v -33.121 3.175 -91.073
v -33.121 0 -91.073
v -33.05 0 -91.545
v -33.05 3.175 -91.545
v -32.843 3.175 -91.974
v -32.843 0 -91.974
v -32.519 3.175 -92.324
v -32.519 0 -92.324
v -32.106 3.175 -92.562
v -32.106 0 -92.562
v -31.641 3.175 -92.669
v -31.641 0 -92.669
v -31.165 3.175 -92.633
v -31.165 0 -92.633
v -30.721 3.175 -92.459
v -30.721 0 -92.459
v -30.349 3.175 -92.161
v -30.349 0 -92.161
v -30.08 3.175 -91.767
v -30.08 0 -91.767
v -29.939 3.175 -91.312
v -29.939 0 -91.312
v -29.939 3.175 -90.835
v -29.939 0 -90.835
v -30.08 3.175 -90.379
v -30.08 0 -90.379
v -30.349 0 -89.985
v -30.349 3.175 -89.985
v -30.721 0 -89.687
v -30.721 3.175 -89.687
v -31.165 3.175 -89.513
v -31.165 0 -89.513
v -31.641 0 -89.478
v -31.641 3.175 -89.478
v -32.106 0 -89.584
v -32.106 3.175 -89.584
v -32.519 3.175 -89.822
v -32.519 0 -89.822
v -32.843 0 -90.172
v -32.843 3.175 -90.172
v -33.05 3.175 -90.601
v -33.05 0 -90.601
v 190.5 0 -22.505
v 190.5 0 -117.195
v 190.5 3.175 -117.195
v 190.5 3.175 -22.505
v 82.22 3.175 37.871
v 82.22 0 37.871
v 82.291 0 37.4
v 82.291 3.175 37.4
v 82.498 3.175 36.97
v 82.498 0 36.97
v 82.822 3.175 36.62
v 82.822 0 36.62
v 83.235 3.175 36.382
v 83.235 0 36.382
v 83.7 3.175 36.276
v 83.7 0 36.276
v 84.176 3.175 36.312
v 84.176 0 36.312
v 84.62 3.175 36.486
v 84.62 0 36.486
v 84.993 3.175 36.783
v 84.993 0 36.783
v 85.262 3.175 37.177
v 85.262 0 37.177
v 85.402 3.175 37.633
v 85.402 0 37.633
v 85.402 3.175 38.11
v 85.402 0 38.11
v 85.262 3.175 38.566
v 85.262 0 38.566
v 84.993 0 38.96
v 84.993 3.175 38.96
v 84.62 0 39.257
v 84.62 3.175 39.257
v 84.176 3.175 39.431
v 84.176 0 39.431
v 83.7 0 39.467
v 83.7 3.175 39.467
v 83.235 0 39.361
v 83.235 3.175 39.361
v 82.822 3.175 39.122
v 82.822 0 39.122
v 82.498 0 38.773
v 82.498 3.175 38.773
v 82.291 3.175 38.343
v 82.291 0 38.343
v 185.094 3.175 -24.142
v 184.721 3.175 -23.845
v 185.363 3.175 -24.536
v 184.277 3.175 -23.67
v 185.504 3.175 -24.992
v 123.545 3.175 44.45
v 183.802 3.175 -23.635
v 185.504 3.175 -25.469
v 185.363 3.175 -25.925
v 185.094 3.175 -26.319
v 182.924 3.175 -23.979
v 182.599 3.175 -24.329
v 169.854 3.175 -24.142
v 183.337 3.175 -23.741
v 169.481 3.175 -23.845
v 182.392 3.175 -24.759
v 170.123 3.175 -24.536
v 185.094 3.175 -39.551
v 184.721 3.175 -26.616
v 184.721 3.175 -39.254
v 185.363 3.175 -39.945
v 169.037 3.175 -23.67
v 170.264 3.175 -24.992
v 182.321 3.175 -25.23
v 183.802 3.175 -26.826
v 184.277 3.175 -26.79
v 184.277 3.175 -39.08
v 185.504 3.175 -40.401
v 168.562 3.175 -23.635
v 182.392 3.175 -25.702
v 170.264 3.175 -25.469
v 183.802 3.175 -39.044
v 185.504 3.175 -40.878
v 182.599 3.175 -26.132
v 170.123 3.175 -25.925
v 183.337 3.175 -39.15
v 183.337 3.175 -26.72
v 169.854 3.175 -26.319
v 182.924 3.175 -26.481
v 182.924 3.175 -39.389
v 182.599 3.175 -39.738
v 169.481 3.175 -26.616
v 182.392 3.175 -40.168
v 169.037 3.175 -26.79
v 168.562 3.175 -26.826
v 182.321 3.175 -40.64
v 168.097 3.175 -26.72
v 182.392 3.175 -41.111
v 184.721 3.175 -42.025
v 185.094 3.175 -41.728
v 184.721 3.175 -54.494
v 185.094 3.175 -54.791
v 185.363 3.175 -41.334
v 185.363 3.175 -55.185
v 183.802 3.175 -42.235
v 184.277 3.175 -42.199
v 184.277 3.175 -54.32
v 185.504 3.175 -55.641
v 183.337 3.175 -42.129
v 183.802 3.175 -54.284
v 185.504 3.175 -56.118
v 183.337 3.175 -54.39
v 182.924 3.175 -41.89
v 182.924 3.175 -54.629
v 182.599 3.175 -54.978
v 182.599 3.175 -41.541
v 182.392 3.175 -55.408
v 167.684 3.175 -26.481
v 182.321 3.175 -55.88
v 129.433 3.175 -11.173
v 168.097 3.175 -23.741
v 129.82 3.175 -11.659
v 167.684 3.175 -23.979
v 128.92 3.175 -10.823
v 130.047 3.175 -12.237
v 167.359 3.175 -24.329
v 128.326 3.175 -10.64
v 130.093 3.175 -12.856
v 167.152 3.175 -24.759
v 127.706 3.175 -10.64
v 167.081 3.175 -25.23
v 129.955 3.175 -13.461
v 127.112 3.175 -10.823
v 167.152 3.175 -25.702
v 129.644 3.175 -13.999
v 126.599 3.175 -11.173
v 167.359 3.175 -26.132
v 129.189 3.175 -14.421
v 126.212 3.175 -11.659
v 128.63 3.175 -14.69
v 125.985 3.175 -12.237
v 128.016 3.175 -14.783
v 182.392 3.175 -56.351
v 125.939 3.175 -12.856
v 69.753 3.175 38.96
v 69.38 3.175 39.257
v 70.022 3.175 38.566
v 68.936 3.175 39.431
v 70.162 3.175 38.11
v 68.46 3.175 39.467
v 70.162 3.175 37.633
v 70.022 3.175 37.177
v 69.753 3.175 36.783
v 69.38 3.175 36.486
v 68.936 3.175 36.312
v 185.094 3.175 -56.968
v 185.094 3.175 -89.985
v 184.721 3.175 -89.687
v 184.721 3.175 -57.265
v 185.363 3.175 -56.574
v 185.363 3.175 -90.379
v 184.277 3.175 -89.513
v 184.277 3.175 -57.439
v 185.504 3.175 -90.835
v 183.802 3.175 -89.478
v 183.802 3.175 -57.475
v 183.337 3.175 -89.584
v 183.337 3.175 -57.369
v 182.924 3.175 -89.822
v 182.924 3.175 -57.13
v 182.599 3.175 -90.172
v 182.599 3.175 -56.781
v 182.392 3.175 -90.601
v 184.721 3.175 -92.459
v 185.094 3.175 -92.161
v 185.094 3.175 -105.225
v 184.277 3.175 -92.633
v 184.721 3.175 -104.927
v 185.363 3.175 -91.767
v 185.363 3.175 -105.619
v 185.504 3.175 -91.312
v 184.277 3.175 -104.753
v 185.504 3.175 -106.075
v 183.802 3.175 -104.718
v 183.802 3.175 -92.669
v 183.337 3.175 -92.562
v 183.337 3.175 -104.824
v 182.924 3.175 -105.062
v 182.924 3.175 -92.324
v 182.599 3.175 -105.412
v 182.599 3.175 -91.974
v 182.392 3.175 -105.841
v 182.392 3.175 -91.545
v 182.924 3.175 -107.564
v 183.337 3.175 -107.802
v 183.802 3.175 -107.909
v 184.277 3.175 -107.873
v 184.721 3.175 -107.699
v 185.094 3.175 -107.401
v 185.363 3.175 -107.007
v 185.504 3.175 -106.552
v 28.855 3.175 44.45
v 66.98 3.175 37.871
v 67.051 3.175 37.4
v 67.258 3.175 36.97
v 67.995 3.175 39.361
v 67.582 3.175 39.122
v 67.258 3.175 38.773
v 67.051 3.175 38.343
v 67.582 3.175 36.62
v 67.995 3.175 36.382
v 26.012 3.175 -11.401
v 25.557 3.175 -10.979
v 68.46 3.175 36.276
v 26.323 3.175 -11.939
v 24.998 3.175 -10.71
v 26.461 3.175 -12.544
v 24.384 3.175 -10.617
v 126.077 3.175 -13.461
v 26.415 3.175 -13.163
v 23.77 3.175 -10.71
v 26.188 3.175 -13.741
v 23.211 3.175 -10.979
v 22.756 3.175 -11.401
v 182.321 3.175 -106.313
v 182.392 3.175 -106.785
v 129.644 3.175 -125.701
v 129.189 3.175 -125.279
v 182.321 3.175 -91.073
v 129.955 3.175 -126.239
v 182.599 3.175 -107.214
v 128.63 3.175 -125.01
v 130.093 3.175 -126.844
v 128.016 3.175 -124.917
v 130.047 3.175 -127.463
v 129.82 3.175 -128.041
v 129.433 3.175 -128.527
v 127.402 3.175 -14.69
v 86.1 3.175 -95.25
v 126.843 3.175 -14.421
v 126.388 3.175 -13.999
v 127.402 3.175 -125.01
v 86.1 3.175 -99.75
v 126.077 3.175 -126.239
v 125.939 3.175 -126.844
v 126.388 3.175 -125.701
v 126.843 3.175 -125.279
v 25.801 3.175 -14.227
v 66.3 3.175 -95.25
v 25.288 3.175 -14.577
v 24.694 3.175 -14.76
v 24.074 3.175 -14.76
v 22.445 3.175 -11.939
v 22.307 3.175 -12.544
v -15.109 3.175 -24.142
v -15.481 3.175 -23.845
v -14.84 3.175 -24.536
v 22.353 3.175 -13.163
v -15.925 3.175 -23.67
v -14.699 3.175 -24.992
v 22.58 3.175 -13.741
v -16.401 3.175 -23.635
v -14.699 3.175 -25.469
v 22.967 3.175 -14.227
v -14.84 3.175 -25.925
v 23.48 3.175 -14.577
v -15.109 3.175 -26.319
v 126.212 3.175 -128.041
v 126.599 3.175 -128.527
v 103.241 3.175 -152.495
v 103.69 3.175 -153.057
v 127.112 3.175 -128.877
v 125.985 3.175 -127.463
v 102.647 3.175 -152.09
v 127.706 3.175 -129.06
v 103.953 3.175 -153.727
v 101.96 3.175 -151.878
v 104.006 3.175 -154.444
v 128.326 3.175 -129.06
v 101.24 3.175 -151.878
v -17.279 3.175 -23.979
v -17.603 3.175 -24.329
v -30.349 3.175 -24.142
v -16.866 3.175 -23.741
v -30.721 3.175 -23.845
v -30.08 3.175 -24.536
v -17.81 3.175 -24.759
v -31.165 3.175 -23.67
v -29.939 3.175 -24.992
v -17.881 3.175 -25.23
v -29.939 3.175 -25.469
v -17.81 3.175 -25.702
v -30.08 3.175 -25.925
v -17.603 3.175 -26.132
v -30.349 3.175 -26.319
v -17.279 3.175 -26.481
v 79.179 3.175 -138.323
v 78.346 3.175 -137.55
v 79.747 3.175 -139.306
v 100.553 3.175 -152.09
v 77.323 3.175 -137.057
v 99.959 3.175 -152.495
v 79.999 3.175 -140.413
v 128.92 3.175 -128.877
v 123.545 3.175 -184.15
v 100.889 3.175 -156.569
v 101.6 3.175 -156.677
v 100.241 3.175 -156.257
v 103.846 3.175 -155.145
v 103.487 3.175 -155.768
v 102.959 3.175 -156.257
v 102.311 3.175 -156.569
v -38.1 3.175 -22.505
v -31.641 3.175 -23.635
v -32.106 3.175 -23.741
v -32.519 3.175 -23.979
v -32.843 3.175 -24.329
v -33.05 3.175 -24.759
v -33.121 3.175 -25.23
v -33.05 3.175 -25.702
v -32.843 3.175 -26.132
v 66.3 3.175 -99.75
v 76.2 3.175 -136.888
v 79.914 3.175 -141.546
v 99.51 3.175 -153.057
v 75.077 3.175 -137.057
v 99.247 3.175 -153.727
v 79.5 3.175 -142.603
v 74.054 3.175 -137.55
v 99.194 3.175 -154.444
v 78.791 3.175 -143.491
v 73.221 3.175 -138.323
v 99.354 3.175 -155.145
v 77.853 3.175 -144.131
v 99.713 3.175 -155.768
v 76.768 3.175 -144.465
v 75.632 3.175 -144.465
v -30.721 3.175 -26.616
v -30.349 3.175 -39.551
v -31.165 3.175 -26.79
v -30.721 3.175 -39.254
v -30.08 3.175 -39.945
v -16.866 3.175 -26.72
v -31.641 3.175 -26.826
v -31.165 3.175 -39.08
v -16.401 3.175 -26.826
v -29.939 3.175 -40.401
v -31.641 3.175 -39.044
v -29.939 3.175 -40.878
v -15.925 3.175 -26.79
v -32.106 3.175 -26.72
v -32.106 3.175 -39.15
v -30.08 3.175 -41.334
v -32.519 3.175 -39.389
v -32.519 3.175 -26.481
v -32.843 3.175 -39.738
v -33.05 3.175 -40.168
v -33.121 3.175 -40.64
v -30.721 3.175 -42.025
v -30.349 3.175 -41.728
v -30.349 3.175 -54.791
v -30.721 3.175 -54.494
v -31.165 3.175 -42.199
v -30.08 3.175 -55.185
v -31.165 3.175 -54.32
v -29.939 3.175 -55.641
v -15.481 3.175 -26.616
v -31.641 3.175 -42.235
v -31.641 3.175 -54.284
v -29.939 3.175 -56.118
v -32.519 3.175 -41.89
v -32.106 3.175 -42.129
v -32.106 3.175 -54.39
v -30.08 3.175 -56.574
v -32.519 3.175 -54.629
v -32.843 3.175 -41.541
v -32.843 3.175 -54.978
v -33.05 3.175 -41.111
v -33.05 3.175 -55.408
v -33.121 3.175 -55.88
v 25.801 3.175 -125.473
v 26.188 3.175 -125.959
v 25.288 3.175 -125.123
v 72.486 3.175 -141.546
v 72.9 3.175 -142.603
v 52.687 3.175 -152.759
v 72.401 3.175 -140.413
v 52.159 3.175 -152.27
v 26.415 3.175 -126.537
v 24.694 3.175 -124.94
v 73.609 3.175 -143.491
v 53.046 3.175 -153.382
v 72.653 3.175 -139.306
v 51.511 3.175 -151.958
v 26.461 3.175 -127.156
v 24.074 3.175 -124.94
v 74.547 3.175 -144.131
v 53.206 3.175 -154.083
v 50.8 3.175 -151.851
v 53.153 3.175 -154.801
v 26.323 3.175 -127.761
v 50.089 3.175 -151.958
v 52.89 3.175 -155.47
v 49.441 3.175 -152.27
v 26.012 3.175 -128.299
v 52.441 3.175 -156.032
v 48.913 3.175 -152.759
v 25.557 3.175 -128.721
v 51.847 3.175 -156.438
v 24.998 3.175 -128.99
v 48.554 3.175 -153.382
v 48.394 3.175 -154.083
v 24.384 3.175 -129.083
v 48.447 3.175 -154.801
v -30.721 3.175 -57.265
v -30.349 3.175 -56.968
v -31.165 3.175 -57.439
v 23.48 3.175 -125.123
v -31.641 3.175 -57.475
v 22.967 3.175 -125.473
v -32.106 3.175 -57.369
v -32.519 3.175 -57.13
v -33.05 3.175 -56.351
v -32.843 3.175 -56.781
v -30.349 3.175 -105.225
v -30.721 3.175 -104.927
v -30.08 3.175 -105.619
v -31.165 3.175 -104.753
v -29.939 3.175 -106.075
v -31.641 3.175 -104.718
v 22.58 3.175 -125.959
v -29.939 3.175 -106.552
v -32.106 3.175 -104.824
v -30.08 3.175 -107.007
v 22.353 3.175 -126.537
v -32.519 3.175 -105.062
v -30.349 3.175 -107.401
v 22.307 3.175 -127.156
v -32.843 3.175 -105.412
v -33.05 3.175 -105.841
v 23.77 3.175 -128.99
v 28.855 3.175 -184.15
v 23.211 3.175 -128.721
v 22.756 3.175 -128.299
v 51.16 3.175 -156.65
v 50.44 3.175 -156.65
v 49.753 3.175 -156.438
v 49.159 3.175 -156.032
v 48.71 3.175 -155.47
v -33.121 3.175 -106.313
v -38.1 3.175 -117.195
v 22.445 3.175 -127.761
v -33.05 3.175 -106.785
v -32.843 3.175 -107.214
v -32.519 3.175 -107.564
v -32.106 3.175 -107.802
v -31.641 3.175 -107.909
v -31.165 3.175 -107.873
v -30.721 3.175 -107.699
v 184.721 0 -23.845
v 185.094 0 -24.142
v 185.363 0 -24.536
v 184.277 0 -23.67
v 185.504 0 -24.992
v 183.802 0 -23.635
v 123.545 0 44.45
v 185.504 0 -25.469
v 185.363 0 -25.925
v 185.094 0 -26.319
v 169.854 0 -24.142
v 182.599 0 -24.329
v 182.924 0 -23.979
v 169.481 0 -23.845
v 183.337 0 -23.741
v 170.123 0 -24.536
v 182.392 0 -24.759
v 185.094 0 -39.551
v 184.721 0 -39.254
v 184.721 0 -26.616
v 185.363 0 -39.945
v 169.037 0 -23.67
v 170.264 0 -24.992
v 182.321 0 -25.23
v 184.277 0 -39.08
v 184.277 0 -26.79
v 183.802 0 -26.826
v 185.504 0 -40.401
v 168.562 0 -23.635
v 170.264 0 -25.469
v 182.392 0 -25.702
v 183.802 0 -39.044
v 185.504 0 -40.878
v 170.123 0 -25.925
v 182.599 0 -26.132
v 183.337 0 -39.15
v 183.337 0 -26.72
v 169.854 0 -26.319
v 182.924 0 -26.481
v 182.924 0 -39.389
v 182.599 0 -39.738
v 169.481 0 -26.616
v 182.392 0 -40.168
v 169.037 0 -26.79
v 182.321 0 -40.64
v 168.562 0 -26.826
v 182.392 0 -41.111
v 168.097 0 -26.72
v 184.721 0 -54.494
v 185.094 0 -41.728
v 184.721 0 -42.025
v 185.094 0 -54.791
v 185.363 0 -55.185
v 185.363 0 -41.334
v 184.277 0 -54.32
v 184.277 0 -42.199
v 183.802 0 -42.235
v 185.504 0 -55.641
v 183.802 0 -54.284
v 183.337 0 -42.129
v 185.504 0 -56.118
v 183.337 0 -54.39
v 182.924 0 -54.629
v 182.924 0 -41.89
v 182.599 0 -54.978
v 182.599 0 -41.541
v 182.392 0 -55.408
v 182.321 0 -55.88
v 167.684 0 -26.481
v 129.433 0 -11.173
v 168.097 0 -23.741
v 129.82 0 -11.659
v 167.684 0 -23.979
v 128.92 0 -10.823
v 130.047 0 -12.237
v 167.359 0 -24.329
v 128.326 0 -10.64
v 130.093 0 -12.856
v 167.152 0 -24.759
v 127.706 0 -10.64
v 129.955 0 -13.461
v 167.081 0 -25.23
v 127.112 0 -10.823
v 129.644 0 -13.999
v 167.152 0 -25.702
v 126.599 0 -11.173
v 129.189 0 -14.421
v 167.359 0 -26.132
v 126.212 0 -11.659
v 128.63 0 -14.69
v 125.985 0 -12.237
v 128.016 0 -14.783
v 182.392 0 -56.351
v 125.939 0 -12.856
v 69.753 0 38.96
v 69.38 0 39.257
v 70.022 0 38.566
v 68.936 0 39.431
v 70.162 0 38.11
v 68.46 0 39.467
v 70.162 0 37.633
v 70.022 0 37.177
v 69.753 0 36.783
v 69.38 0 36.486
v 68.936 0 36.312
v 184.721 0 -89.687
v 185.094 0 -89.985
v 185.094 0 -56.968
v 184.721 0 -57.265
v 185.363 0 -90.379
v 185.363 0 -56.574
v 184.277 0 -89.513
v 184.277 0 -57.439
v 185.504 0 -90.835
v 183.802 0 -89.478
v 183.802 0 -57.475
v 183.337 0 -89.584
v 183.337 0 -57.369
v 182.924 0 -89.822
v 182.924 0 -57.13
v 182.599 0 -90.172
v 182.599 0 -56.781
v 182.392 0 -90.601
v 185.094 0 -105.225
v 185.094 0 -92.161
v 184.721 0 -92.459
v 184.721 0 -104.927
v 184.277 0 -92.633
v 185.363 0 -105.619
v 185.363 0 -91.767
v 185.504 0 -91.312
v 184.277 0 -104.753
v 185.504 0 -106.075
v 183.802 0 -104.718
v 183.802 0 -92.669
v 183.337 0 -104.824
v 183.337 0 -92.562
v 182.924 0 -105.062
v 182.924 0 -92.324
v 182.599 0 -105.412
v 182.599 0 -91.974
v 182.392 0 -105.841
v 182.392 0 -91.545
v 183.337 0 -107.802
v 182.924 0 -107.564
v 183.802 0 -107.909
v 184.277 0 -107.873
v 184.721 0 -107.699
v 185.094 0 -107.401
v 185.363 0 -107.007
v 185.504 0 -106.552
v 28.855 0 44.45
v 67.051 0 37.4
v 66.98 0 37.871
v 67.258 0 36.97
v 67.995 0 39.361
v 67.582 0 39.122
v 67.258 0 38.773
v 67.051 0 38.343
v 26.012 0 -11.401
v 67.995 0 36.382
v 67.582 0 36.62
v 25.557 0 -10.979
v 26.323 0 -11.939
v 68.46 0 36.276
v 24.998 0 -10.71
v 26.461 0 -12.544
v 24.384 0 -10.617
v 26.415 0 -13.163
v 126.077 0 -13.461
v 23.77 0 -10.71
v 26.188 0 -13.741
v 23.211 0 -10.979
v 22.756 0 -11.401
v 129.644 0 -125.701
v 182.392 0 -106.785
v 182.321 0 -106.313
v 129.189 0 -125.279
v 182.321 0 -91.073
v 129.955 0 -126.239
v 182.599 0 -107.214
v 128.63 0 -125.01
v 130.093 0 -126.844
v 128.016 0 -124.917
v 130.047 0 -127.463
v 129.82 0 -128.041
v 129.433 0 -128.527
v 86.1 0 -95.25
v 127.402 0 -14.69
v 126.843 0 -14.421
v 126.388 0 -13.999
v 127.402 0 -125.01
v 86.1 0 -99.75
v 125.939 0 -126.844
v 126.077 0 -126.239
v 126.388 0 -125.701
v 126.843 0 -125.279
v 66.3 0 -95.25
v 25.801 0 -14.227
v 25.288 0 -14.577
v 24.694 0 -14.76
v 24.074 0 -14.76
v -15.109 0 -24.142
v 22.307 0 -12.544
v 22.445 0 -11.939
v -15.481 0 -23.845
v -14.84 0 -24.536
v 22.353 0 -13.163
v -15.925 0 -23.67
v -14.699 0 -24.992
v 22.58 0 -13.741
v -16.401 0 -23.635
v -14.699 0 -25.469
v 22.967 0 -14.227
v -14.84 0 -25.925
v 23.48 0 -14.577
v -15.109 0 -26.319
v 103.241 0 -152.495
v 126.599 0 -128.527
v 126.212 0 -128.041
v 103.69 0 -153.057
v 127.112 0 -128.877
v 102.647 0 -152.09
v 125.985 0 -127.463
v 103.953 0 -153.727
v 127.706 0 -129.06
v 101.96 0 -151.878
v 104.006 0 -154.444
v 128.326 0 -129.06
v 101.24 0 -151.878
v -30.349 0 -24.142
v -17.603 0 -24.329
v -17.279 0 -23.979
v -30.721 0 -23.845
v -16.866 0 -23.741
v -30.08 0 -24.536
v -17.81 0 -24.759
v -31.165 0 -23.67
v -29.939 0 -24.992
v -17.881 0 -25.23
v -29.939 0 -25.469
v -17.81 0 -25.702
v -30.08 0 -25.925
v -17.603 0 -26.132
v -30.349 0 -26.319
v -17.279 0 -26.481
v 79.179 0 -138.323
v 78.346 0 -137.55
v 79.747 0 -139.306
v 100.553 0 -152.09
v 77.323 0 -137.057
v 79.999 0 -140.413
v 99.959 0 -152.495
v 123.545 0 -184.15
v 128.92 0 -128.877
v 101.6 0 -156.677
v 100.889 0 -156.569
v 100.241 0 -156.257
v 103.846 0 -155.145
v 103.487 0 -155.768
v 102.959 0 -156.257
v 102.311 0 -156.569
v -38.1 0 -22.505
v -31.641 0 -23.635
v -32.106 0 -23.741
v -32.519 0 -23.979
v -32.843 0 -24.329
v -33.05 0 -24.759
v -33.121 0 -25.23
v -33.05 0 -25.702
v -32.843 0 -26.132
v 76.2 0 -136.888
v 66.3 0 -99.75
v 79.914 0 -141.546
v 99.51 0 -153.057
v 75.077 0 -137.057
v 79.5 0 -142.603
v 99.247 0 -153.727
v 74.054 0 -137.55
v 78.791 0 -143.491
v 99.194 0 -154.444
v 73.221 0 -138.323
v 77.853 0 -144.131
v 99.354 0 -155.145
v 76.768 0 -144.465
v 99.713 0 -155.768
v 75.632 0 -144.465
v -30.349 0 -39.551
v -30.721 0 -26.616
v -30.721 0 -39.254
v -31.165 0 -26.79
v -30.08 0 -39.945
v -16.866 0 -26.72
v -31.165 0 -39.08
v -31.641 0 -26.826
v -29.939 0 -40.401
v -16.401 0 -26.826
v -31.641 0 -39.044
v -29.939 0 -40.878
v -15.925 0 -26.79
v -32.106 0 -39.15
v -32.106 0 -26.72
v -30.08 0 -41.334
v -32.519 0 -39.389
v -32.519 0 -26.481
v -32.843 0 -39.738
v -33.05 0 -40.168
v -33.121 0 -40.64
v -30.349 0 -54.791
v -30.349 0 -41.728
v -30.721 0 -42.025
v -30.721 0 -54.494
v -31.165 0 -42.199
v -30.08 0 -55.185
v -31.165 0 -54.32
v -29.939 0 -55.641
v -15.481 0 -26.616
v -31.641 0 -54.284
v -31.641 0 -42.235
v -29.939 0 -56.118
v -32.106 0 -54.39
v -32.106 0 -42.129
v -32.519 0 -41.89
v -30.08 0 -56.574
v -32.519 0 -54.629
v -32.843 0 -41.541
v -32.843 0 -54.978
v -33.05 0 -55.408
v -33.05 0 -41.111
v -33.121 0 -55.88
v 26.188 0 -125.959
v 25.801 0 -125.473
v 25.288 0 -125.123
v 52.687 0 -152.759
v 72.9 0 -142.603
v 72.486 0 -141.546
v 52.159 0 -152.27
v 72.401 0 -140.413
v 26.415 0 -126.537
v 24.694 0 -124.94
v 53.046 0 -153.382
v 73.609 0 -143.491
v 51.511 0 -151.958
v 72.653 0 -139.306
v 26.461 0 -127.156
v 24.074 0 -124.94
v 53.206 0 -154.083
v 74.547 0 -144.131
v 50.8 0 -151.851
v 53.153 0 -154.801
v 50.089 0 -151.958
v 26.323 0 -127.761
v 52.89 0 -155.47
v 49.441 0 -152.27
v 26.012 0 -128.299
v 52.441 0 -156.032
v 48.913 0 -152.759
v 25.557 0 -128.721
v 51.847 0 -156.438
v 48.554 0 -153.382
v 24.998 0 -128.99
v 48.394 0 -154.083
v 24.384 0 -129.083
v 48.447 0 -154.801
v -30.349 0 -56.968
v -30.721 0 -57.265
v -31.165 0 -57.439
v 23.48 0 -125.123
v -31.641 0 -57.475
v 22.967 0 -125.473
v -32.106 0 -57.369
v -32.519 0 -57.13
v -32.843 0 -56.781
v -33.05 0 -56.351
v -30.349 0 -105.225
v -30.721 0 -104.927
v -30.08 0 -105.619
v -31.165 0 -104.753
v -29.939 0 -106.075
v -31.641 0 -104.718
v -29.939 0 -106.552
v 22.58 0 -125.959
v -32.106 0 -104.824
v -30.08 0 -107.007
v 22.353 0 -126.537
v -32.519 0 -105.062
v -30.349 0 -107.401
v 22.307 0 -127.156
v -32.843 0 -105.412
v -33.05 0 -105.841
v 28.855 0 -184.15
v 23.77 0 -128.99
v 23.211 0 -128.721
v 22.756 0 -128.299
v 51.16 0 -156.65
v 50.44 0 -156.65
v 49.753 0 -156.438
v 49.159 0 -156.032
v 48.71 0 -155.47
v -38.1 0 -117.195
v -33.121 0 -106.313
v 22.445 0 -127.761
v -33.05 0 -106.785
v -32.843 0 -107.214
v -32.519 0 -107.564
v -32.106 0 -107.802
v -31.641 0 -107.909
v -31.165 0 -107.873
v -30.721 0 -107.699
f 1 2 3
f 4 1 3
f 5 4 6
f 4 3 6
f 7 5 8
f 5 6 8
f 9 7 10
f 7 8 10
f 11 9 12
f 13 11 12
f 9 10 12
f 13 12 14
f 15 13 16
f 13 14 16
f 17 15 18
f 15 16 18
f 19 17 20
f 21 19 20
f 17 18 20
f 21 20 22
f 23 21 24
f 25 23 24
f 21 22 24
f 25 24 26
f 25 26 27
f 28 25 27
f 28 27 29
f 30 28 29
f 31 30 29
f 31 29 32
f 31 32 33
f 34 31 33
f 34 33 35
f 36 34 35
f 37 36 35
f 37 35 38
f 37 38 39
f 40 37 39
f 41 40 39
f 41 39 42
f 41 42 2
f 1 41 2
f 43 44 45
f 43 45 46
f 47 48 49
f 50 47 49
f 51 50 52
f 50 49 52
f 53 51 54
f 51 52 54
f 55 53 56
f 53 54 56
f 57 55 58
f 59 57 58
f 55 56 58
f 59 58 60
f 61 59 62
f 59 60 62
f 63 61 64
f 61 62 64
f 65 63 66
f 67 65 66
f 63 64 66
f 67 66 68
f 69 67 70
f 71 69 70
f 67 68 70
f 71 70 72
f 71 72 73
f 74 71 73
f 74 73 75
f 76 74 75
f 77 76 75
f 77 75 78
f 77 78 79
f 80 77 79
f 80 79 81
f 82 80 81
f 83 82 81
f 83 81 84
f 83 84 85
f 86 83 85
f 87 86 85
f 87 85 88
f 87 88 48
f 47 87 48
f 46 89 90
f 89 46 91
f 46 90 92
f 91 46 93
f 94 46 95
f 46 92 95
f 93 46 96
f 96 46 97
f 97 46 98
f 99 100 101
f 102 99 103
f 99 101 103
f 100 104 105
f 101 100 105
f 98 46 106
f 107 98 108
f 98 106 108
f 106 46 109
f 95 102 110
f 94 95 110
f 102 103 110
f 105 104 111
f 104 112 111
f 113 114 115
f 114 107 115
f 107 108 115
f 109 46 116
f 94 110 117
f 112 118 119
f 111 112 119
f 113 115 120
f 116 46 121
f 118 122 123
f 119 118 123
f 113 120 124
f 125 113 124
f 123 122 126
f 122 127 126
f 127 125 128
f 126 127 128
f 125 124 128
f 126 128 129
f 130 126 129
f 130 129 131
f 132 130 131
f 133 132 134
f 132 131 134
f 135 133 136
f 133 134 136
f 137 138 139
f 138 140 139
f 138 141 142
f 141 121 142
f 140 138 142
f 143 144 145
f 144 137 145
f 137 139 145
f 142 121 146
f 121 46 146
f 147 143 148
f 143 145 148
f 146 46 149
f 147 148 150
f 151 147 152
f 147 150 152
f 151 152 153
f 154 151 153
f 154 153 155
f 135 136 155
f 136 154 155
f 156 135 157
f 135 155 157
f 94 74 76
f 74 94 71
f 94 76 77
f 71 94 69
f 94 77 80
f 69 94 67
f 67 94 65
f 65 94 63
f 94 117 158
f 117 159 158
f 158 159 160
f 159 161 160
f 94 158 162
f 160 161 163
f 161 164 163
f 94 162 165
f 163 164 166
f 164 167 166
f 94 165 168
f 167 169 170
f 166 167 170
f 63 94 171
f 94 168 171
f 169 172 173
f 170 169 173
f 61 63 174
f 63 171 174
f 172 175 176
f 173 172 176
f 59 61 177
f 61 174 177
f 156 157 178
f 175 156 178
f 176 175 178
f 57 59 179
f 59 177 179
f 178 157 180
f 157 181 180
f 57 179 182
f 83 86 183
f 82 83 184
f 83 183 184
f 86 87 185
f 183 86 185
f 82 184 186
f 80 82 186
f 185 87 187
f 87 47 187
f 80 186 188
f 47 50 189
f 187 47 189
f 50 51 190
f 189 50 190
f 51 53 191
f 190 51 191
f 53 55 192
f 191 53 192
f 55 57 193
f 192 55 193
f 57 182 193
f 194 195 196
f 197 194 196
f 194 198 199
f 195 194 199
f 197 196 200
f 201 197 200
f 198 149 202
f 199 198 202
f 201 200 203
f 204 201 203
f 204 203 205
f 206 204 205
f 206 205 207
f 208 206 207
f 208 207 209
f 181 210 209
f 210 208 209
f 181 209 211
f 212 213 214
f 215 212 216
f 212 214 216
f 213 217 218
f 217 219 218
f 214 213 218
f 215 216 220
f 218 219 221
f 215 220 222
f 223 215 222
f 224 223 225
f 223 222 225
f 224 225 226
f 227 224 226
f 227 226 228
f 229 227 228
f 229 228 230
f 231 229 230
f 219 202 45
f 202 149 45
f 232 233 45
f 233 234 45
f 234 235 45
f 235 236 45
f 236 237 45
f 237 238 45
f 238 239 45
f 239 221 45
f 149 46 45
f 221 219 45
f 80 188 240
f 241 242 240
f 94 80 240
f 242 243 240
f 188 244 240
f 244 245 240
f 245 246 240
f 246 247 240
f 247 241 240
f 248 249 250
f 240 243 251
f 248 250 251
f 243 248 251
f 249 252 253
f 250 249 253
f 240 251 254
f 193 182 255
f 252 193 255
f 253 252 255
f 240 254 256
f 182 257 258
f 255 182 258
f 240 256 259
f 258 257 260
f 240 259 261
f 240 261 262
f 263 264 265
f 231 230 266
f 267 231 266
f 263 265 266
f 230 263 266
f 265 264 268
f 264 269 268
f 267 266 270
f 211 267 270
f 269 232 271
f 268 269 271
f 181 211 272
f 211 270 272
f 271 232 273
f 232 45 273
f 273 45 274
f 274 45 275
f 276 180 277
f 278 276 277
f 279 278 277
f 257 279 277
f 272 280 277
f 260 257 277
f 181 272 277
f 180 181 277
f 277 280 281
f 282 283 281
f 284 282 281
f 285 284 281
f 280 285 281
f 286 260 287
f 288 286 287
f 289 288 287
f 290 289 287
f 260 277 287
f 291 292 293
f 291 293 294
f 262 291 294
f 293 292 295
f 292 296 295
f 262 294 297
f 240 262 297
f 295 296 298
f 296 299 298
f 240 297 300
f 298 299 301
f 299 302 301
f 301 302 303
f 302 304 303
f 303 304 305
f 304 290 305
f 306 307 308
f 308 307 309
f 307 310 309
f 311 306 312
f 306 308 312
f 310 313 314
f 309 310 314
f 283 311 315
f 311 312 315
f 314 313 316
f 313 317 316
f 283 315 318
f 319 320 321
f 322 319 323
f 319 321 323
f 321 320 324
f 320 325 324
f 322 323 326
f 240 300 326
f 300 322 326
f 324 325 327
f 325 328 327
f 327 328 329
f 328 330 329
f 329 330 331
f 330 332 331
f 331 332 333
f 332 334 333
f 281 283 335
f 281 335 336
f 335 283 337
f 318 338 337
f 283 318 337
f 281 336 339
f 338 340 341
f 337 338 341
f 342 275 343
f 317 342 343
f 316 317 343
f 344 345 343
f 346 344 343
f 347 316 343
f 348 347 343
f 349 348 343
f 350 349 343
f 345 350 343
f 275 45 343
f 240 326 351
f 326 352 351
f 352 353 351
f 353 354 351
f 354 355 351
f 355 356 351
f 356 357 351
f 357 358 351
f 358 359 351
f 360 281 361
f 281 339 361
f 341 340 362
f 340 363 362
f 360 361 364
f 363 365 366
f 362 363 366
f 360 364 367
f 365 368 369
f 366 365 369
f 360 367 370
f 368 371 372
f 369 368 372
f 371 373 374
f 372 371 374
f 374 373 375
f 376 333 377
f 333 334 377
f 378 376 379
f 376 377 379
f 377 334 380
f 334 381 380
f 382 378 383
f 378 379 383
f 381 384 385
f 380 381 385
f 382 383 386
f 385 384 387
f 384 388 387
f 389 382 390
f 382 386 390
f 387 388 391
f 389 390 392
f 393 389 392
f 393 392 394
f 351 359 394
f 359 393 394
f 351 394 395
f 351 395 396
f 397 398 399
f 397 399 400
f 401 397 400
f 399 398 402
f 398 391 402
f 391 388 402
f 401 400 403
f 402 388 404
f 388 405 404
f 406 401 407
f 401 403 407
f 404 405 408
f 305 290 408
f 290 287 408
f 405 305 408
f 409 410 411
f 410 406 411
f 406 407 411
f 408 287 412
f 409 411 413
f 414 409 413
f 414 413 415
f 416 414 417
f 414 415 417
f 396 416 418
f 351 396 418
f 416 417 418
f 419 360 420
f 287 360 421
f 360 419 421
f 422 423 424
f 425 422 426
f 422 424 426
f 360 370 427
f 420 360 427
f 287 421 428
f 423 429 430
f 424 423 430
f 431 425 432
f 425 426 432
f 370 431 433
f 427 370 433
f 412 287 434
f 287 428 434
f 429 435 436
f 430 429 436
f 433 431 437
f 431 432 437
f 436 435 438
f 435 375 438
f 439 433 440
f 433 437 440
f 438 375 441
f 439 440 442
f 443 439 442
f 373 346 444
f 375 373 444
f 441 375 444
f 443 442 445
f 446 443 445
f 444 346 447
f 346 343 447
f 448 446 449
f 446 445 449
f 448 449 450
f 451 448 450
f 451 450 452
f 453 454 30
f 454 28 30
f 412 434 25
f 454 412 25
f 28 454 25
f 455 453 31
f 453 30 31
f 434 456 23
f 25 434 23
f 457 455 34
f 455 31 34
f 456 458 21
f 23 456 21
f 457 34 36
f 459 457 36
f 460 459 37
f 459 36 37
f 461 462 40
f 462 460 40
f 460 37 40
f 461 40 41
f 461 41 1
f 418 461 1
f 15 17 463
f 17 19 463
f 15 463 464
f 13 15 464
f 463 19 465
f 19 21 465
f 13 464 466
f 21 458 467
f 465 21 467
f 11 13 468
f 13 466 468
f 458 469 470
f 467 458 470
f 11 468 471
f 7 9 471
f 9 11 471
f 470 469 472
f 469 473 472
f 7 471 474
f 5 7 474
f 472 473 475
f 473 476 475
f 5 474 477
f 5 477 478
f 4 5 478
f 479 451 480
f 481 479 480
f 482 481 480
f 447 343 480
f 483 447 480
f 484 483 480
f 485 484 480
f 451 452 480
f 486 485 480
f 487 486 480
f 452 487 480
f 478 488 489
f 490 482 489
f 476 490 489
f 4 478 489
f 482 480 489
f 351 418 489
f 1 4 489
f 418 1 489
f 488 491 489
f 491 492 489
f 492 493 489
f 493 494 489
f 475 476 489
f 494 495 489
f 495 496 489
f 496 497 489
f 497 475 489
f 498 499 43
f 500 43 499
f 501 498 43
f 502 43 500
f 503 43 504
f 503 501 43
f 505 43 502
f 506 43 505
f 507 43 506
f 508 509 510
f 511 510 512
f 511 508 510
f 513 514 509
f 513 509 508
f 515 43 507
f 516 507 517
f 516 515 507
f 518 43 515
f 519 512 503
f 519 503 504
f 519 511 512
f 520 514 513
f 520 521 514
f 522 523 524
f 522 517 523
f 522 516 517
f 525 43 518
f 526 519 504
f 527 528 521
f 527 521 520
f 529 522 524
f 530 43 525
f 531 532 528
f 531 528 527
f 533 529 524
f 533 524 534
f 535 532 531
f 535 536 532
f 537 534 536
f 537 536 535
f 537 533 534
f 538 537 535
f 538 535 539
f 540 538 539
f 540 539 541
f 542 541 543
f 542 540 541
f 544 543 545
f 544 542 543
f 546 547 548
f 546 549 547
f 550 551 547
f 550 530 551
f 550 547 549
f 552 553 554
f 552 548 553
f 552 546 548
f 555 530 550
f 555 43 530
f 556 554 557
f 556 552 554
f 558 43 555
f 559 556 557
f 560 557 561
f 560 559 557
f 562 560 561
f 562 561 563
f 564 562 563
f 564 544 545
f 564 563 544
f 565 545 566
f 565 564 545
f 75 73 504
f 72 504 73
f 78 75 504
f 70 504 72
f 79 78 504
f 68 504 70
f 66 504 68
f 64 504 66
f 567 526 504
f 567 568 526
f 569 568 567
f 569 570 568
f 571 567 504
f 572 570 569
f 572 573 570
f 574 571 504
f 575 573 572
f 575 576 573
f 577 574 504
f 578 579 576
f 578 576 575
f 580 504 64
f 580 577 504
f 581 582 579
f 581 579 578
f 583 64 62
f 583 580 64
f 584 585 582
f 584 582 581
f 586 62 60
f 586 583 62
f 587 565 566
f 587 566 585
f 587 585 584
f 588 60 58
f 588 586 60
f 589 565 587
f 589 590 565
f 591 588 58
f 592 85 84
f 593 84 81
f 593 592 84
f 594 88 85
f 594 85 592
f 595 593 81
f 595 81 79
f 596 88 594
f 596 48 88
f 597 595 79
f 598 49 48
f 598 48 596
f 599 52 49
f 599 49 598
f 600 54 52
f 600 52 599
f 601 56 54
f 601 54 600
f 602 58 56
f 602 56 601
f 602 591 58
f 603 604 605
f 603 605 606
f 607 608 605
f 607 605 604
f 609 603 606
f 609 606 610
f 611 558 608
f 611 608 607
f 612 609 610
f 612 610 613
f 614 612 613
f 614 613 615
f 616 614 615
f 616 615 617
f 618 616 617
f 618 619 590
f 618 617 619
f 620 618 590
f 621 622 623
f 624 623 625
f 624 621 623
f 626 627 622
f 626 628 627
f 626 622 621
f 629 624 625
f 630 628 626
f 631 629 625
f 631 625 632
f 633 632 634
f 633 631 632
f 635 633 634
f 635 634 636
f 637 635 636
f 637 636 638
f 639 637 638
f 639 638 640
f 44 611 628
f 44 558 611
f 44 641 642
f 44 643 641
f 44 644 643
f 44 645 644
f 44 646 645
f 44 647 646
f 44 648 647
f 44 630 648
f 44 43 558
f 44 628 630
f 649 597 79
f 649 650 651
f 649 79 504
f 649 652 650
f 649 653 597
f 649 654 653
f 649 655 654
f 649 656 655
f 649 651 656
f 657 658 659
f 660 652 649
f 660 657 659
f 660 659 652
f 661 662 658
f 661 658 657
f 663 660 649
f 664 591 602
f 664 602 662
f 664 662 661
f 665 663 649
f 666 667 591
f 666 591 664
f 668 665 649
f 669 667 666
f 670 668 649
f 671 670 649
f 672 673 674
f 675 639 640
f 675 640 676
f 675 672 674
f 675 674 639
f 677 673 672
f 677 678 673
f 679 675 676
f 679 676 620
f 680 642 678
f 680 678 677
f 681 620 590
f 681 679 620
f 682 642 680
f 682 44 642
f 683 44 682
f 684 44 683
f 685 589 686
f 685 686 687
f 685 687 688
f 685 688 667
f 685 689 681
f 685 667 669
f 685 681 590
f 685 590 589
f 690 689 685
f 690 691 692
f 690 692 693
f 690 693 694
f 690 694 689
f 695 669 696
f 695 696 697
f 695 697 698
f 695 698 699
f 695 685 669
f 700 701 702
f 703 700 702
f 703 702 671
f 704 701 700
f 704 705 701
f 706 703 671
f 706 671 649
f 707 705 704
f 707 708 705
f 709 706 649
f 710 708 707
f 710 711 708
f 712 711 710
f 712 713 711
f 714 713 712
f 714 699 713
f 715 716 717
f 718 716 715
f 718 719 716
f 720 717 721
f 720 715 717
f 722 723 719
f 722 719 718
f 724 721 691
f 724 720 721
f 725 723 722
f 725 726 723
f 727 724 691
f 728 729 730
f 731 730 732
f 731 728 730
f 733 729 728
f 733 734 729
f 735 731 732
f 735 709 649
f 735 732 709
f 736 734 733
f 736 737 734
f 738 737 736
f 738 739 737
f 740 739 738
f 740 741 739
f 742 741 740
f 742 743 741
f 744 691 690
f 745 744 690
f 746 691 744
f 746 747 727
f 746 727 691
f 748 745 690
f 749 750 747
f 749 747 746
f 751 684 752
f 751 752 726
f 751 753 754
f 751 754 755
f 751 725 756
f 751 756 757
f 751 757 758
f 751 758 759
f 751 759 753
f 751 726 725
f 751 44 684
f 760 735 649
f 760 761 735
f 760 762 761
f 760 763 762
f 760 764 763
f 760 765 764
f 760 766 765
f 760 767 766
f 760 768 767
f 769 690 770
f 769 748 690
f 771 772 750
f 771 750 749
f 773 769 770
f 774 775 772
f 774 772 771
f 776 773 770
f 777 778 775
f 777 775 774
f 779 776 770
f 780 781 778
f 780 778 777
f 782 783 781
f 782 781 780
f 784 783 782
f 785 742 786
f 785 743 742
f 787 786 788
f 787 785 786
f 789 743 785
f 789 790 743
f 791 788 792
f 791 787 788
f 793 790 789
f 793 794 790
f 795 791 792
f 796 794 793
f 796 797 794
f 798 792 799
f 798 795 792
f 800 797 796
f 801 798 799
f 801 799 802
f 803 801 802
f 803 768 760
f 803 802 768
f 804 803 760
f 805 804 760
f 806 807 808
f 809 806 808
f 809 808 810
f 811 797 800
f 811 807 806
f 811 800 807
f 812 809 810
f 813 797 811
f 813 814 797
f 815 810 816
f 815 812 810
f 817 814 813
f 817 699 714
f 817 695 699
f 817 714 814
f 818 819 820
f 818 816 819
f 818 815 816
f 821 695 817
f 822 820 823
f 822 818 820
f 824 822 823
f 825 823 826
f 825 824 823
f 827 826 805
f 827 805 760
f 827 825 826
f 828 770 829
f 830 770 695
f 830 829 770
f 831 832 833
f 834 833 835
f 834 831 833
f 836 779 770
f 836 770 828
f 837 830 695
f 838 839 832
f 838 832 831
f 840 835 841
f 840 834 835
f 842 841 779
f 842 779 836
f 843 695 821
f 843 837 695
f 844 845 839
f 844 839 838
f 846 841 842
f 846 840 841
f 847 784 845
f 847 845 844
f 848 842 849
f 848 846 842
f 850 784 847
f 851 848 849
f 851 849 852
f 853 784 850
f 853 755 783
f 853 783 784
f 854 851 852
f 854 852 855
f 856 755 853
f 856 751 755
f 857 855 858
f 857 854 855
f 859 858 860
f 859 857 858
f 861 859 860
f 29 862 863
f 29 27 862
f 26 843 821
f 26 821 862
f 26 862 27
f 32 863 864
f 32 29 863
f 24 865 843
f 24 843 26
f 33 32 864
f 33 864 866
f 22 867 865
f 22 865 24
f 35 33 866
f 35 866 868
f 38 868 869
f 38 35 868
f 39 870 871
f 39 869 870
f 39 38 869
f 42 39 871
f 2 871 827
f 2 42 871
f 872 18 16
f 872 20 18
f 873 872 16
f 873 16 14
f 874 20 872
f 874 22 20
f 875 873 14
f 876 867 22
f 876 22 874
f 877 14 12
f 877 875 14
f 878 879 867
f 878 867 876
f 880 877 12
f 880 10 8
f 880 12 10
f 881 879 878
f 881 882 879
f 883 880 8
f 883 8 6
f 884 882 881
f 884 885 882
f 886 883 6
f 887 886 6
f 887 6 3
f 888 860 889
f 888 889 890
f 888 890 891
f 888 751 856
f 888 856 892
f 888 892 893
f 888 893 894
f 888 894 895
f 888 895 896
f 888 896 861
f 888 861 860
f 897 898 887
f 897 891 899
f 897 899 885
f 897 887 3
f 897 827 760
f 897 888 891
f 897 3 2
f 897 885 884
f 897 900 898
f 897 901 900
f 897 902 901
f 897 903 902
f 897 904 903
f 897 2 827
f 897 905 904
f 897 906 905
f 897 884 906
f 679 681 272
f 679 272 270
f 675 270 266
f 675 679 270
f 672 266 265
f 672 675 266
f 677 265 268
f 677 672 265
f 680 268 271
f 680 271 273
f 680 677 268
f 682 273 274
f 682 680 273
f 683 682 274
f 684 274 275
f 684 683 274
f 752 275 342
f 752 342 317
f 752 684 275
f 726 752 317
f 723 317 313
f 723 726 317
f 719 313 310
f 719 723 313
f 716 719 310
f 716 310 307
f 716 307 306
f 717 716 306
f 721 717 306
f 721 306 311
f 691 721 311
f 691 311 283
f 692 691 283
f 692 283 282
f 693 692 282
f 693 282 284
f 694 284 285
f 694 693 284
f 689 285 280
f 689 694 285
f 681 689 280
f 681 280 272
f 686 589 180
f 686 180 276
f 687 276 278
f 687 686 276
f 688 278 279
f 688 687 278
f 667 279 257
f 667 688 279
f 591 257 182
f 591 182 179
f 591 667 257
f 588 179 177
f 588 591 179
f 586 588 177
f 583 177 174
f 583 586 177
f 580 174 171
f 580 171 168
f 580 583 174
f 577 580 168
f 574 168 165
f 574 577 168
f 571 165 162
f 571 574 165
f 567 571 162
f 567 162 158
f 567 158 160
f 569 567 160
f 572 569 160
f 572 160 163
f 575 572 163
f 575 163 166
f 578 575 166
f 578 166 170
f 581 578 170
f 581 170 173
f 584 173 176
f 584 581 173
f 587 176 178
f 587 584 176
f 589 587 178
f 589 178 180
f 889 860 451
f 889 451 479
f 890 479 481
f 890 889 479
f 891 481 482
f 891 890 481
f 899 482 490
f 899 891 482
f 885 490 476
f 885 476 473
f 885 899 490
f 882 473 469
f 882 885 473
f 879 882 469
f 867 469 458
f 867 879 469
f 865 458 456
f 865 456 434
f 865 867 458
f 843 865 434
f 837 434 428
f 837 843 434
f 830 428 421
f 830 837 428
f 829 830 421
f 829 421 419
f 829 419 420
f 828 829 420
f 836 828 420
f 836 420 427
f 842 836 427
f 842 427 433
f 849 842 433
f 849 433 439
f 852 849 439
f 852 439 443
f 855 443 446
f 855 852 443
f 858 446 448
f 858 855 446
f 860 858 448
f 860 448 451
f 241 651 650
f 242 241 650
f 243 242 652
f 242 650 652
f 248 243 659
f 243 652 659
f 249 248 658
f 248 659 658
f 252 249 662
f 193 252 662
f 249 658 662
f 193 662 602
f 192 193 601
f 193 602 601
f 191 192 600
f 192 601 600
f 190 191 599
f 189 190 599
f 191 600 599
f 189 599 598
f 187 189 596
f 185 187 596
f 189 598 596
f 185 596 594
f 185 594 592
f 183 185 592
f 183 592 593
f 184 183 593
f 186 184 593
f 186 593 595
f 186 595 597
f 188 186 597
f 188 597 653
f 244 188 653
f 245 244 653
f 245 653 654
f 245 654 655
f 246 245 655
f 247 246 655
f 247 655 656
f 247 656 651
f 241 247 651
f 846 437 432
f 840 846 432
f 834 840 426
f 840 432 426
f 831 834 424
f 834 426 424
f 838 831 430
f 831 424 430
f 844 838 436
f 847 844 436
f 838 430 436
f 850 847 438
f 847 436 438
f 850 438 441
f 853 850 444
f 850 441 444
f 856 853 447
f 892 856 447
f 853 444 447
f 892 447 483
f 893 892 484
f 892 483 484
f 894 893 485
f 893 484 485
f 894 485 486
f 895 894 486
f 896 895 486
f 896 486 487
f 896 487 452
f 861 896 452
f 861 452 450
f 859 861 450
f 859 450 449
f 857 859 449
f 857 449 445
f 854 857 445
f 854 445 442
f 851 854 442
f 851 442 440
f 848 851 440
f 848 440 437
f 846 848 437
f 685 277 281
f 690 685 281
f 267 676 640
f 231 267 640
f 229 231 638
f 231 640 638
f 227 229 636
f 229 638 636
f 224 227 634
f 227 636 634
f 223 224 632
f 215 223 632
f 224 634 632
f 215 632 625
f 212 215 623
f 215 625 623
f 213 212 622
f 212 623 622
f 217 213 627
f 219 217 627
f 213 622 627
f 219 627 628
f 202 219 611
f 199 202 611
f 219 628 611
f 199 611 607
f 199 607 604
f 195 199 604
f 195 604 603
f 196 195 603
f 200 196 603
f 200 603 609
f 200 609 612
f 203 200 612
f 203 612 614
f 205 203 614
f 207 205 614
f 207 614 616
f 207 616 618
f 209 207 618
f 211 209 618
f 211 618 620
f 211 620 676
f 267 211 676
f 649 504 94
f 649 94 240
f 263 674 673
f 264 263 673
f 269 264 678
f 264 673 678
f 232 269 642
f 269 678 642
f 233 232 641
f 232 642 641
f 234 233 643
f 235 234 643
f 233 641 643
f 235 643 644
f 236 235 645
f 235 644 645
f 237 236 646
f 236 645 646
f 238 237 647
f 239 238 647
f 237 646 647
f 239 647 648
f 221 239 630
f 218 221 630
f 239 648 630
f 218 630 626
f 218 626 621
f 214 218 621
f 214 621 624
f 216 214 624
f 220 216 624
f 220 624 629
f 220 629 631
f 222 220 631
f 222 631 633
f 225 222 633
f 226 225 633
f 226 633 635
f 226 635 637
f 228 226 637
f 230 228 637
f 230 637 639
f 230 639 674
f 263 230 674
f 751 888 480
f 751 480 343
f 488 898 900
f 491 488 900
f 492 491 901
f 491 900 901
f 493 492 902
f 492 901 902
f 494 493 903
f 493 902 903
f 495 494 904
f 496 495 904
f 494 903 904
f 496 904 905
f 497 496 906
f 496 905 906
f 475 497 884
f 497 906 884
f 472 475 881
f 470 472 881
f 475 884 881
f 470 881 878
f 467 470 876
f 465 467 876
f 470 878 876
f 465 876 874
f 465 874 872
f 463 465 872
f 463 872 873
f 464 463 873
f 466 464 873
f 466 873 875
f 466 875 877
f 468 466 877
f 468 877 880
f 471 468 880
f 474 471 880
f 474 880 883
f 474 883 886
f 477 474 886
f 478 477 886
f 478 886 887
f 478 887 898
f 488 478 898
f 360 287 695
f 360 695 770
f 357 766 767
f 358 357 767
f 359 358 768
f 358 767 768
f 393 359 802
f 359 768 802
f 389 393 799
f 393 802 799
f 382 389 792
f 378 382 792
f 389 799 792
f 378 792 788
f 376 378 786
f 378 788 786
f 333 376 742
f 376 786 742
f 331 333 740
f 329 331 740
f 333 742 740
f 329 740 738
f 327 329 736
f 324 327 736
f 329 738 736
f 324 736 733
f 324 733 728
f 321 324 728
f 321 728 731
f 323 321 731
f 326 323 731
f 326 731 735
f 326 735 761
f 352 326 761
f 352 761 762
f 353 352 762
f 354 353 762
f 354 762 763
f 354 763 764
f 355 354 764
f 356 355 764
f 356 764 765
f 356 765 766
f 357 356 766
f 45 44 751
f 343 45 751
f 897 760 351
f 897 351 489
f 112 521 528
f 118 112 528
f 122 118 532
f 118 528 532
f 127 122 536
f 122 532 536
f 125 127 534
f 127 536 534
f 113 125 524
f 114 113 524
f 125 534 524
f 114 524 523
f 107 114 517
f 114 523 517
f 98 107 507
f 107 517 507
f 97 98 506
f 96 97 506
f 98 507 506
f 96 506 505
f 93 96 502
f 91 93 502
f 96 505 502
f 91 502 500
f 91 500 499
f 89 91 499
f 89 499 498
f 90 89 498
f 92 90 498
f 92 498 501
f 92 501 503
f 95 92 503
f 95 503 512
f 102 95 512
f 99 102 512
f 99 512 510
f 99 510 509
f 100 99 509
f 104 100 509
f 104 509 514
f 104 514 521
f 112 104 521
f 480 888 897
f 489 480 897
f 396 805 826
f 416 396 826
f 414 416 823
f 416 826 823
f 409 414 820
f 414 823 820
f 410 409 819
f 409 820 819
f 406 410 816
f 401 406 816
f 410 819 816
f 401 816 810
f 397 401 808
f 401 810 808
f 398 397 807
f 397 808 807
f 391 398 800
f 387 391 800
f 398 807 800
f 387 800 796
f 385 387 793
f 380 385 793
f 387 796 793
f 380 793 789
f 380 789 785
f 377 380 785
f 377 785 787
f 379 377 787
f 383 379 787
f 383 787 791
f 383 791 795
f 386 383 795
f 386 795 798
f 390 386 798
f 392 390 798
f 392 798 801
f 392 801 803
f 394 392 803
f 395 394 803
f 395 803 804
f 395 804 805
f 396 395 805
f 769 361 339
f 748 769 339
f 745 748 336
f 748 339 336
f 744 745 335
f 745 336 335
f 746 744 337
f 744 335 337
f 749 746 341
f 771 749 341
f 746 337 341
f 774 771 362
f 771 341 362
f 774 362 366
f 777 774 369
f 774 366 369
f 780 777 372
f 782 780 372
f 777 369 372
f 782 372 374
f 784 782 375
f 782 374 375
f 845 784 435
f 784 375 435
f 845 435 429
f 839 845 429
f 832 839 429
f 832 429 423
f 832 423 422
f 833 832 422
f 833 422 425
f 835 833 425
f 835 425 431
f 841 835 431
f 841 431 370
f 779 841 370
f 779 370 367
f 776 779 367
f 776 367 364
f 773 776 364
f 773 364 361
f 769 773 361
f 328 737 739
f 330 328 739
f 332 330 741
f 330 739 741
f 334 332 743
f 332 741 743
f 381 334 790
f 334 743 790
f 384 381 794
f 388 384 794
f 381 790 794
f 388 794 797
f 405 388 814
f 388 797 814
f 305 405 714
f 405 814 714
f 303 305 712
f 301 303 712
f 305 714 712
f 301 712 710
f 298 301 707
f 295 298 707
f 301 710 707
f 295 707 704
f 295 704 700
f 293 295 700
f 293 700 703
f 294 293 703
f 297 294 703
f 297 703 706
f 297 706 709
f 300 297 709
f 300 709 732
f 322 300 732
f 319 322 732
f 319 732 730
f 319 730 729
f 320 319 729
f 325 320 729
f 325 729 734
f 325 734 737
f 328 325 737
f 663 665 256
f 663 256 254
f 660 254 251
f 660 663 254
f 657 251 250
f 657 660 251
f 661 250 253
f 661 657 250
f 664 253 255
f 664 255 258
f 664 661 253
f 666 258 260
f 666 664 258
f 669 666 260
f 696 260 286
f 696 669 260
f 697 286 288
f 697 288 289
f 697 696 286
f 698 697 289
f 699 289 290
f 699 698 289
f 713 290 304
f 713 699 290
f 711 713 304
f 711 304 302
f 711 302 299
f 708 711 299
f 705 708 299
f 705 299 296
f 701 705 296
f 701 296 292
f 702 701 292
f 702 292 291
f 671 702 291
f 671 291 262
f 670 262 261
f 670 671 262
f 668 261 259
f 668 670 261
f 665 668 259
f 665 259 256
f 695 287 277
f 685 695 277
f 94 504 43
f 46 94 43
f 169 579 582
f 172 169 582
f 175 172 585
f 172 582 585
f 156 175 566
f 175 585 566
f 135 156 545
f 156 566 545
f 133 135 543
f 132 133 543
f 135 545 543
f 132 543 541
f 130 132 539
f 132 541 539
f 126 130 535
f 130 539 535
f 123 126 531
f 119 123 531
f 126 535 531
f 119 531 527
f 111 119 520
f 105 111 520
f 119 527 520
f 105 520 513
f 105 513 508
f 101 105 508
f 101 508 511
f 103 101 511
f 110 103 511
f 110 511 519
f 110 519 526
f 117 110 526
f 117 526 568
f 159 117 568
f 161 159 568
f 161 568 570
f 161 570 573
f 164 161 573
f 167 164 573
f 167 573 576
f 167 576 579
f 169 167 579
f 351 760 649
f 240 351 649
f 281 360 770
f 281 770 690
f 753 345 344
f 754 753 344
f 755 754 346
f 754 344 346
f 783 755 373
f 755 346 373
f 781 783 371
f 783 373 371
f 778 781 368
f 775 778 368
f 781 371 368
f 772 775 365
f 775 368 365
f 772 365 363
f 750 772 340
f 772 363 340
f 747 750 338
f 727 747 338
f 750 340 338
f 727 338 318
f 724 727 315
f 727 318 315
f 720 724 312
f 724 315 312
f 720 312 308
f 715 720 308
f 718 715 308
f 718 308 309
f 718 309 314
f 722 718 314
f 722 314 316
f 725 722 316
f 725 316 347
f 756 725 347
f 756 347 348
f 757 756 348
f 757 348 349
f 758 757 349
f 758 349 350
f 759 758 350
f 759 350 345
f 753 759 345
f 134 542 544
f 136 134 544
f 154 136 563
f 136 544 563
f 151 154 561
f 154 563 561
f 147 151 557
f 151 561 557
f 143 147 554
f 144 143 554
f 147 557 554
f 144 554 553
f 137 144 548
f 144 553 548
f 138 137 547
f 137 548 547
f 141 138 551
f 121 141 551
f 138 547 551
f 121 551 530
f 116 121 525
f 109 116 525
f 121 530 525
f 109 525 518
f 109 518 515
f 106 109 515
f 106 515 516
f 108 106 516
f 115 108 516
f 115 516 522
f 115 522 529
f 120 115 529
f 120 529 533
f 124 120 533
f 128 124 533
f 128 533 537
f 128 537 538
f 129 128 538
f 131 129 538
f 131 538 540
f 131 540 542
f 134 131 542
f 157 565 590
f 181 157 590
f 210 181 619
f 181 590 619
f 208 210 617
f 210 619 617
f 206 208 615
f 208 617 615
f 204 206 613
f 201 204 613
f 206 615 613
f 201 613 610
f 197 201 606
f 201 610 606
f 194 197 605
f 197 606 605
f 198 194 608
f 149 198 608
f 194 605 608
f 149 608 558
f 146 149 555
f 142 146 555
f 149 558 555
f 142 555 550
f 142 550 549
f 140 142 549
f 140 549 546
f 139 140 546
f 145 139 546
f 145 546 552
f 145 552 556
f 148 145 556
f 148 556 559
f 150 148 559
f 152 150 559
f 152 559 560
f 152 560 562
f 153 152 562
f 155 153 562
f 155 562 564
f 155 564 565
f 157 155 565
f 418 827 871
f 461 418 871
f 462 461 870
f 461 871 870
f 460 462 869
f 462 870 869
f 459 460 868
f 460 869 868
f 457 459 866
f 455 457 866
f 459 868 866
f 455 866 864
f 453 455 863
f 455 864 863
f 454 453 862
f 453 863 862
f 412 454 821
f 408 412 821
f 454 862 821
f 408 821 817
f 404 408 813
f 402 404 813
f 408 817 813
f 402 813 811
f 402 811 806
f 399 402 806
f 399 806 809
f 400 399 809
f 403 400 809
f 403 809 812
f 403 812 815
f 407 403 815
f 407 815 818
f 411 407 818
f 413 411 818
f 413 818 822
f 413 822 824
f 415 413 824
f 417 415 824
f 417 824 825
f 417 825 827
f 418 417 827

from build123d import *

# Parameters (mm, degrees)
SKETCH1_R            = 2.0828
BOSS_EXTRUDE1_DEPTH  = 3.175
M3_CLEARANCE_HOLE1_D = 3.2
SKETCH5_W            = 19.8
SKETCH5_H            = 4.5
CUT_EXTRUDE1_DEPTH   = 265.974627323
SKETCH7_R            = 2.413
CUT_EXTRUDE2_DEPTH   = 265.974627323
SKETCH8_R            = 3.81
CUT_EXTRUDE3_DEPTH   = 265.974627323


with BuildPart() as part:
    # Sketch1 → Boss-Extrude1 (new body)
    with BuildSketch(Plane(origin=(0, 0, 0), x_dir=(1, 0, 0), z_dir=(0, 1, 0))):
        Polygon((28.855389821, 184.15), (123.544610179, 184.15), (176.5, 131.194610179), (182.5, 125.194610179), (190.5, 117.194610179), (190.5, 22.505389821), (182.5, 14.505389821), (176.5, 8.505389821), (137.544610179, -30.45), (131.544610179, -36.45), (123.544610179, -44.45), (28.855389821, -44.45), (20.855389821, -36.45), (14.855389821, -30.45), (-24.1, 8.505389821), (-30.1, 14.505389821), (-38.1, 22.505389821), (-38.1, 117.194610179), (-30.1, 125.194610179), (-24.1, 131.194610179), align=None)
        with Locations(Location((24.384, 12.7, 0), (0, 0, 270))):
            Circle(SKETCH1_R, mode=Mode.SUBTRACT)
        with Locations(Location((128.016, 12.7, 0), (0, 0, 90))):
            Circle(SKETCH1_R, mode=Mode.SUBTRACT)
        with Locations(Location((128.016, 127, 0), (0, 0, 270))):
            Circle(SKETCH1_R, mode=Mode.SUBTRACT)
        with Locations(Location((24.384, 127, 0), (0, 0, 90))):
            Circle(SKETCH1_R, mode=Mode.SUBTRACT)
    extrude(amount=BOSS_EXTRUDE1_DEPTH)

    # M3 Clearance Hole1 (through all)
    with Locations(Plane(origin=(0, 3.175, 0), x_dir=(1, 0, 0), z_dir=(0, 1, 0))):
        with Locations((-31.5214, 106.313101446), (-31.5214, 91.073101446), (-31.5214, 55.8795536), (-31.5214, 40.6395536), (-31.5214, 25.230335162), (-16.2814, 25.230335162), (68.58, -37.8714), (83.82, -37.8714), (183.9214, 25.230335162), (168.6814, 25.230335162), (183.9214, 40.6395536), (183.9214, 55.8795536), (183.9214, 91.073101446), (183.9214, 106.313101446)):
            Hole(M3_CLEARANCE_HOLE1_D / 2)

    # Sketch5 → Cut-Extrude1 (cut, through all)
    with BuildSketch(Plane(origin=(0, 3.175, 0), x_dir=(1, 0, 0), z_dir=(0, 1, 0))):
        with Locations((76.2, 97.5)):
            Rectangle(SKETCH5_W, SKETCH5_H)
    extrude(amount=-CUT_EXTRUDE1_DEPTH, mode=Mode.SUBTRACT)

    # Sketch7 → Cut-Extrude2 (cut, through all)
    with BuildSketch(Plane(origin=(0, 3.175, 0), x_dir=(1, 0, 0), z_dir=(0, 1, 0))):
        with Locations(Location((50.8, 154.263560488, 0), (0, 0, 270))):
            Circle(SKETCH7_R)
        with Locations(Location((101.6, 154.263560488, 0), (0, 0, 90))):
            Circle(SKETCH7_R)
    extrude(amount=-CUT_EXTRUDE2_DEPTH, mode=Mode.SUBTRACT)

    # Sketch8 → Cut-Extrude3 (cut, through all)
    with BuildSketch(Plane(origin=(0, 3.175, 0), x_dir=(1, 0, 0), z_dir=(0, 1, 0))):
        with Locations(Location((76.2, 140.698010266, 0), (0, 0, 270))):
            Circle(SKETCH8_R)
    extrude(amount=-CUT_EXTRUDE3_DEPTH, mode=Mode.SUBTRACT)


solid = part.part
